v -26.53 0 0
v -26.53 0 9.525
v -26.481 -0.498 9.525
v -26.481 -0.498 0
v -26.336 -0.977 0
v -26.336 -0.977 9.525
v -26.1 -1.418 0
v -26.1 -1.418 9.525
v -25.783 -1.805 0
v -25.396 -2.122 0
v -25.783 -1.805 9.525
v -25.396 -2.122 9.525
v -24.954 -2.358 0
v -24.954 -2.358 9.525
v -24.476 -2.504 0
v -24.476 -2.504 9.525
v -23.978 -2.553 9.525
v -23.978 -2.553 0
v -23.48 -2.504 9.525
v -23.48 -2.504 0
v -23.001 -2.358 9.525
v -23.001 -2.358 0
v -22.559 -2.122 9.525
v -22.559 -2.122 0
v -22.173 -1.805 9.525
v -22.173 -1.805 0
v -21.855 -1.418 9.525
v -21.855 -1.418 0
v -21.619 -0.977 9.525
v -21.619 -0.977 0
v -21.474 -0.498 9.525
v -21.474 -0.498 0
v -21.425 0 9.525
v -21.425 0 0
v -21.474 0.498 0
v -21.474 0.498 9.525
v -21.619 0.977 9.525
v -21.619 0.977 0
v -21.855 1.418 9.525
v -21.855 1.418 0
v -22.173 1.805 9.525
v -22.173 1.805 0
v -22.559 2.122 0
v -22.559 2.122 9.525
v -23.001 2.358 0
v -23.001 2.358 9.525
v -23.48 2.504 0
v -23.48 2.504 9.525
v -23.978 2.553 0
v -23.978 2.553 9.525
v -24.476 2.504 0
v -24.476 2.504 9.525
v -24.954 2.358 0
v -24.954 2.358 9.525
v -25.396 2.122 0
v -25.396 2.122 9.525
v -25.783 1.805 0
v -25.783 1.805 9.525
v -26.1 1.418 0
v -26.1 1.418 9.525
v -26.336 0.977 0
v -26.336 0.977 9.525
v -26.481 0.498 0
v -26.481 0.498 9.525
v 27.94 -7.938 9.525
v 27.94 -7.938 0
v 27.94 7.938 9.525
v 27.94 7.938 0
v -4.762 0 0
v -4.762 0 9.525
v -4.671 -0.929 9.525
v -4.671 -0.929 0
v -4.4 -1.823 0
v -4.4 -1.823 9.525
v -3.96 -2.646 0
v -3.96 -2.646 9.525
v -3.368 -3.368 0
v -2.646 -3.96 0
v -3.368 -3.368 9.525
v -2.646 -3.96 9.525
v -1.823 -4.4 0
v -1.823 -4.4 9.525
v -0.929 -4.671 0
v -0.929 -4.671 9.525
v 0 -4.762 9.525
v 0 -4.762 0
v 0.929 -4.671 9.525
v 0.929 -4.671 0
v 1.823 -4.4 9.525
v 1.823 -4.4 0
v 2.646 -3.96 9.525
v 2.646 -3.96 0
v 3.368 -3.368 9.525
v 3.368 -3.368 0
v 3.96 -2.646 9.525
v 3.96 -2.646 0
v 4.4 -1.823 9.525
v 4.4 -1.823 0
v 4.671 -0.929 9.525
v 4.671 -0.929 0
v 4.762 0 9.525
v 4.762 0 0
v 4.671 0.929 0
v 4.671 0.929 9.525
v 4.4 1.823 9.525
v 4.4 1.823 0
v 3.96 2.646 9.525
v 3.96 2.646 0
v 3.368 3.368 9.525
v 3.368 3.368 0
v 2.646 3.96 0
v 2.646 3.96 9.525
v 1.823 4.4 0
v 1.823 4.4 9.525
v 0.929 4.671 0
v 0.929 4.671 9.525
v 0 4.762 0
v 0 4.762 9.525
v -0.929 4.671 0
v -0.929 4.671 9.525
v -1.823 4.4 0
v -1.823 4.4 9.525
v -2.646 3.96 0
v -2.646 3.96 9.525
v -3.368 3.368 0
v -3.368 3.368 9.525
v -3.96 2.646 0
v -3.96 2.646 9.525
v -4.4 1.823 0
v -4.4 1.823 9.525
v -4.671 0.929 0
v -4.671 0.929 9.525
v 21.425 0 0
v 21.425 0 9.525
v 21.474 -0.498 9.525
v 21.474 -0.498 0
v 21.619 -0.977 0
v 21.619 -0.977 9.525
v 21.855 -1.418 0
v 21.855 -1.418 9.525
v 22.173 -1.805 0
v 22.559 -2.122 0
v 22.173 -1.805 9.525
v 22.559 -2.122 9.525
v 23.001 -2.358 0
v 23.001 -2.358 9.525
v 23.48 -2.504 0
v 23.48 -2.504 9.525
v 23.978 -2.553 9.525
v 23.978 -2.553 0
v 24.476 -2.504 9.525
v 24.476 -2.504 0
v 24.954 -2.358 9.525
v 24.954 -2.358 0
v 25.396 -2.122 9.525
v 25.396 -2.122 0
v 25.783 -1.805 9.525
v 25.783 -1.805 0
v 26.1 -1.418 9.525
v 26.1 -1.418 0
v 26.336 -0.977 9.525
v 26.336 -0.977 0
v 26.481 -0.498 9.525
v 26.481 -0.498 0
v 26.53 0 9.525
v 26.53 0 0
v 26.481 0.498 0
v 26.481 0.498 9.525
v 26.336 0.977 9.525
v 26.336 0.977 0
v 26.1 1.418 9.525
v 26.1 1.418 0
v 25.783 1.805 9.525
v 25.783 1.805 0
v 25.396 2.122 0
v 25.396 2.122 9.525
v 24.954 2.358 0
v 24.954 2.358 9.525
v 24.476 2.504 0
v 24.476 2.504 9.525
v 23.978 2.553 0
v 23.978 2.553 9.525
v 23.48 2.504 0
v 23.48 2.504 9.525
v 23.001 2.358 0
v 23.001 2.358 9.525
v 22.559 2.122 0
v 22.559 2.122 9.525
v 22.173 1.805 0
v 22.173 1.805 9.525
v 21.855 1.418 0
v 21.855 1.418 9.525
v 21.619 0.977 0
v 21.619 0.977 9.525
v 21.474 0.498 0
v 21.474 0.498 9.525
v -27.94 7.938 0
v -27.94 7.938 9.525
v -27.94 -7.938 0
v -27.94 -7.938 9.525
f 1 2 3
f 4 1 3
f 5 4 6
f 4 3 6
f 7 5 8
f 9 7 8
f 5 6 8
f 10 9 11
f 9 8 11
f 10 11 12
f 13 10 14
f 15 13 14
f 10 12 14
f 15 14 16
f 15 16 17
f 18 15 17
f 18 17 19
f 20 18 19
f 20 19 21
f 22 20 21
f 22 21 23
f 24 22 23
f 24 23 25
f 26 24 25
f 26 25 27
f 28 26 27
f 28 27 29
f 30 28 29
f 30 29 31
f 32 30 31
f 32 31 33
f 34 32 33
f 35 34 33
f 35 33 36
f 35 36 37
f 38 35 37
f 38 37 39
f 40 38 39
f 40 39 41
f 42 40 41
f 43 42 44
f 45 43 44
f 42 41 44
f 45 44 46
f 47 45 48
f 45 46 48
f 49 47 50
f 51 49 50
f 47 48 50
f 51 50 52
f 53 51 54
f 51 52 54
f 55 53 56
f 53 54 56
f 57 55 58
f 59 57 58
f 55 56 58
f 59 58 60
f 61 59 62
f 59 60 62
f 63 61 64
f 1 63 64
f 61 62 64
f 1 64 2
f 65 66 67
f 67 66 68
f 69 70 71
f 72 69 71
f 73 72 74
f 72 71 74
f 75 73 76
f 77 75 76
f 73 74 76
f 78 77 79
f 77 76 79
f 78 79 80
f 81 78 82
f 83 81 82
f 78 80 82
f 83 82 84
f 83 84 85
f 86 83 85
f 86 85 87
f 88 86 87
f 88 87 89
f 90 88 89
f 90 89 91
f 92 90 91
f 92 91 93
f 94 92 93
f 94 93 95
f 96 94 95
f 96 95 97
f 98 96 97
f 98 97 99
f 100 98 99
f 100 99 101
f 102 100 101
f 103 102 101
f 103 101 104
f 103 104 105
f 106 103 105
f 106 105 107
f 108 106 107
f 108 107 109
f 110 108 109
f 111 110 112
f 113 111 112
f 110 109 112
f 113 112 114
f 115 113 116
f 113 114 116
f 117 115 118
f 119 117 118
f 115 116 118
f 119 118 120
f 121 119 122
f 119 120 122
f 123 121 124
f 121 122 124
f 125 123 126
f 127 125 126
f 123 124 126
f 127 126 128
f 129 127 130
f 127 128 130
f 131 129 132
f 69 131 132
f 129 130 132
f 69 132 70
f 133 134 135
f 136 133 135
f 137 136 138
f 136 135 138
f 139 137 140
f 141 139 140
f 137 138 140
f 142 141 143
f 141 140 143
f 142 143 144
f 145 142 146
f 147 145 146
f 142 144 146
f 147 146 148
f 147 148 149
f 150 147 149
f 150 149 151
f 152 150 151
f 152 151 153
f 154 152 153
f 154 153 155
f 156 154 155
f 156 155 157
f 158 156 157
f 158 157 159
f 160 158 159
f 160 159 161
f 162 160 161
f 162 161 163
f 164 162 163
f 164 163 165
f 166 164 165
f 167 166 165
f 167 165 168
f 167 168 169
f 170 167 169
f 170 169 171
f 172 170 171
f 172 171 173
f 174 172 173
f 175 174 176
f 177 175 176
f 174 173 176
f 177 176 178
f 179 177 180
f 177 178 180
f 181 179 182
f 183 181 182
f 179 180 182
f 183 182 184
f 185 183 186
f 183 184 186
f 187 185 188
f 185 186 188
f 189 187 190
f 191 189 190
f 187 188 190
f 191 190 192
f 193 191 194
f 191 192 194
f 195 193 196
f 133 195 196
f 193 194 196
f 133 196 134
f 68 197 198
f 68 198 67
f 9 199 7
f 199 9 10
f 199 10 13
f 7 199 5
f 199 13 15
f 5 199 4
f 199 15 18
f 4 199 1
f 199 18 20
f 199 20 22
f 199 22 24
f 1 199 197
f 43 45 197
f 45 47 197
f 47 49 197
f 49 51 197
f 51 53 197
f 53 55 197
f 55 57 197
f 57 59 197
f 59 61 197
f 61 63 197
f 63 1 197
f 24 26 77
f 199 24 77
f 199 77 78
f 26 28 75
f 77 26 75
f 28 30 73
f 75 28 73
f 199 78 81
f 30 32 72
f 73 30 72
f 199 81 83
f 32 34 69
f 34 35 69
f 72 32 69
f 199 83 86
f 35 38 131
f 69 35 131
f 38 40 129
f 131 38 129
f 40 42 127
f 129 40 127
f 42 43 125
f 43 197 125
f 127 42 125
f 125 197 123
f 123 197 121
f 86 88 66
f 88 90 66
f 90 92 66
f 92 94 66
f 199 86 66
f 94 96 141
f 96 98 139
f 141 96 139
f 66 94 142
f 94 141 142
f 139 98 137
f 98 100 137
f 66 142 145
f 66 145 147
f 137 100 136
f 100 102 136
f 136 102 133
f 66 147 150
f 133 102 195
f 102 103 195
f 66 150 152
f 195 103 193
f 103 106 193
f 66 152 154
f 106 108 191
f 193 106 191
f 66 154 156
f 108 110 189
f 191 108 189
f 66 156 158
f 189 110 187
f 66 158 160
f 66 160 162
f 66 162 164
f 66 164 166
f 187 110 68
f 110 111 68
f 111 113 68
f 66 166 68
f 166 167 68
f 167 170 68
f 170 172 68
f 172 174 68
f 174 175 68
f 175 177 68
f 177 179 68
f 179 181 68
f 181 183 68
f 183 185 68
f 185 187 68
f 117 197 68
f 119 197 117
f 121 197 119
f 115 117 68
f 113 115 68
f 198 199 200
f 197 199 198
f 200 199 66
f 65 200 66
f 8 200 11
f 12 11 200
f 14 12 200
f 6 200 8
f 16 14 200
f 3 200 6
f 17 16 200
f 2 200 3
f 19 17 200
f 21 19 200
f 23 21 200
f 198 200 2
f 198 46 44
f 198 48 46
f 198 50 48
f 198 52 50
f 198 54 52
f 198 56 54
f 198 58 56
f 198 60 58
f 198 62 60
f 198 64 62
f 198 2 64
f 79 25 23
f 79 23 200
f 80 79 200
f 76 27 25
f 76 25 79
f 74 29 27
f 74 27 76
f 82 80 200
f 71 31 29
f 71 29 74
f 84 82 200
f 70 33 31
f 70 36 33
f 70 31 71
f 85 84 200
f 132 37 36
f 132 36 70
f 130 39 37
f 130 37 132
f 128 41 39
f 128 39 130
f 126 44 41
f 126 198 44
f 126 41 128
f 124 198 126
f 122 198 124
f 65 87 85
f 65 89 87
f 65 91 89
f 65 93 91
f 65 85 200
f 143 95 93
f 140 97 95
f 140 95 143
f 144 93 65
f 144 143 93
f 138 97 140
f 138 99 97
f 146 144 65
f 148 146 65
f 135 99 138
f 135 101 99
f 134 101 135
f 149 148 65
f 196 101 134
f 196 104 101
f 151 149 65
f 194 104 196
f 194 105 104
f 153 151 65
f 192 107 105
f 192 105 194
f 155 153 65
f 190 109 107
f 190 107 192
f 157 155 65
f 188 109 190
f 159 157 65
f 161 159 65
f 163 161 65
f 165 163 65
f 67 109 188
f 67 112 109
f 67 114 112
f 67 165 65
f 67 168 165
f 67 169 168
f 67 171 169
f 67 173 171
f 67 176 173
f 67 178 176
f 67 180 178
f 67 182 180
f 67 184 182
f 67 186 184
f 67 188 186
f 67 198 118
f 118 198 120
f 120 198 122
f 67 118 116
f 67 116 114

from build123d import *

# Parameters (mm, degrees)
F0_W     = 55.88
F0_H     = 15.875
F1_DEPTH = 9.525
F2_D     = 5.1054
F3_D     = 9.525


with BuildPart() as f1:
    # F0 (on Top) → F1 (new body)
    with BuildSketch(Plane.XY):
        Rectangle(F0_W, F0_H)
    extrude(amount=F1_DEPTH)

    # F2 (through all)
    with Locations(Plane(origin=(0, 0, 0), x_dir=(1, 0, 0), z_dir=(0, 0, -1))):
        with Locations((-23.9776, 0), (23.9776, 0)):
            Hole(F2_D / 2)

    # F3 (through all)
    with Locations(Plane(origin=(0, 0, 0), x_dir=(1, 0, 0), z_dir=(0, 0, -1))):
        with Locations((0, 0)):
            Hole(F3_D / 2)


solid = f1.part
